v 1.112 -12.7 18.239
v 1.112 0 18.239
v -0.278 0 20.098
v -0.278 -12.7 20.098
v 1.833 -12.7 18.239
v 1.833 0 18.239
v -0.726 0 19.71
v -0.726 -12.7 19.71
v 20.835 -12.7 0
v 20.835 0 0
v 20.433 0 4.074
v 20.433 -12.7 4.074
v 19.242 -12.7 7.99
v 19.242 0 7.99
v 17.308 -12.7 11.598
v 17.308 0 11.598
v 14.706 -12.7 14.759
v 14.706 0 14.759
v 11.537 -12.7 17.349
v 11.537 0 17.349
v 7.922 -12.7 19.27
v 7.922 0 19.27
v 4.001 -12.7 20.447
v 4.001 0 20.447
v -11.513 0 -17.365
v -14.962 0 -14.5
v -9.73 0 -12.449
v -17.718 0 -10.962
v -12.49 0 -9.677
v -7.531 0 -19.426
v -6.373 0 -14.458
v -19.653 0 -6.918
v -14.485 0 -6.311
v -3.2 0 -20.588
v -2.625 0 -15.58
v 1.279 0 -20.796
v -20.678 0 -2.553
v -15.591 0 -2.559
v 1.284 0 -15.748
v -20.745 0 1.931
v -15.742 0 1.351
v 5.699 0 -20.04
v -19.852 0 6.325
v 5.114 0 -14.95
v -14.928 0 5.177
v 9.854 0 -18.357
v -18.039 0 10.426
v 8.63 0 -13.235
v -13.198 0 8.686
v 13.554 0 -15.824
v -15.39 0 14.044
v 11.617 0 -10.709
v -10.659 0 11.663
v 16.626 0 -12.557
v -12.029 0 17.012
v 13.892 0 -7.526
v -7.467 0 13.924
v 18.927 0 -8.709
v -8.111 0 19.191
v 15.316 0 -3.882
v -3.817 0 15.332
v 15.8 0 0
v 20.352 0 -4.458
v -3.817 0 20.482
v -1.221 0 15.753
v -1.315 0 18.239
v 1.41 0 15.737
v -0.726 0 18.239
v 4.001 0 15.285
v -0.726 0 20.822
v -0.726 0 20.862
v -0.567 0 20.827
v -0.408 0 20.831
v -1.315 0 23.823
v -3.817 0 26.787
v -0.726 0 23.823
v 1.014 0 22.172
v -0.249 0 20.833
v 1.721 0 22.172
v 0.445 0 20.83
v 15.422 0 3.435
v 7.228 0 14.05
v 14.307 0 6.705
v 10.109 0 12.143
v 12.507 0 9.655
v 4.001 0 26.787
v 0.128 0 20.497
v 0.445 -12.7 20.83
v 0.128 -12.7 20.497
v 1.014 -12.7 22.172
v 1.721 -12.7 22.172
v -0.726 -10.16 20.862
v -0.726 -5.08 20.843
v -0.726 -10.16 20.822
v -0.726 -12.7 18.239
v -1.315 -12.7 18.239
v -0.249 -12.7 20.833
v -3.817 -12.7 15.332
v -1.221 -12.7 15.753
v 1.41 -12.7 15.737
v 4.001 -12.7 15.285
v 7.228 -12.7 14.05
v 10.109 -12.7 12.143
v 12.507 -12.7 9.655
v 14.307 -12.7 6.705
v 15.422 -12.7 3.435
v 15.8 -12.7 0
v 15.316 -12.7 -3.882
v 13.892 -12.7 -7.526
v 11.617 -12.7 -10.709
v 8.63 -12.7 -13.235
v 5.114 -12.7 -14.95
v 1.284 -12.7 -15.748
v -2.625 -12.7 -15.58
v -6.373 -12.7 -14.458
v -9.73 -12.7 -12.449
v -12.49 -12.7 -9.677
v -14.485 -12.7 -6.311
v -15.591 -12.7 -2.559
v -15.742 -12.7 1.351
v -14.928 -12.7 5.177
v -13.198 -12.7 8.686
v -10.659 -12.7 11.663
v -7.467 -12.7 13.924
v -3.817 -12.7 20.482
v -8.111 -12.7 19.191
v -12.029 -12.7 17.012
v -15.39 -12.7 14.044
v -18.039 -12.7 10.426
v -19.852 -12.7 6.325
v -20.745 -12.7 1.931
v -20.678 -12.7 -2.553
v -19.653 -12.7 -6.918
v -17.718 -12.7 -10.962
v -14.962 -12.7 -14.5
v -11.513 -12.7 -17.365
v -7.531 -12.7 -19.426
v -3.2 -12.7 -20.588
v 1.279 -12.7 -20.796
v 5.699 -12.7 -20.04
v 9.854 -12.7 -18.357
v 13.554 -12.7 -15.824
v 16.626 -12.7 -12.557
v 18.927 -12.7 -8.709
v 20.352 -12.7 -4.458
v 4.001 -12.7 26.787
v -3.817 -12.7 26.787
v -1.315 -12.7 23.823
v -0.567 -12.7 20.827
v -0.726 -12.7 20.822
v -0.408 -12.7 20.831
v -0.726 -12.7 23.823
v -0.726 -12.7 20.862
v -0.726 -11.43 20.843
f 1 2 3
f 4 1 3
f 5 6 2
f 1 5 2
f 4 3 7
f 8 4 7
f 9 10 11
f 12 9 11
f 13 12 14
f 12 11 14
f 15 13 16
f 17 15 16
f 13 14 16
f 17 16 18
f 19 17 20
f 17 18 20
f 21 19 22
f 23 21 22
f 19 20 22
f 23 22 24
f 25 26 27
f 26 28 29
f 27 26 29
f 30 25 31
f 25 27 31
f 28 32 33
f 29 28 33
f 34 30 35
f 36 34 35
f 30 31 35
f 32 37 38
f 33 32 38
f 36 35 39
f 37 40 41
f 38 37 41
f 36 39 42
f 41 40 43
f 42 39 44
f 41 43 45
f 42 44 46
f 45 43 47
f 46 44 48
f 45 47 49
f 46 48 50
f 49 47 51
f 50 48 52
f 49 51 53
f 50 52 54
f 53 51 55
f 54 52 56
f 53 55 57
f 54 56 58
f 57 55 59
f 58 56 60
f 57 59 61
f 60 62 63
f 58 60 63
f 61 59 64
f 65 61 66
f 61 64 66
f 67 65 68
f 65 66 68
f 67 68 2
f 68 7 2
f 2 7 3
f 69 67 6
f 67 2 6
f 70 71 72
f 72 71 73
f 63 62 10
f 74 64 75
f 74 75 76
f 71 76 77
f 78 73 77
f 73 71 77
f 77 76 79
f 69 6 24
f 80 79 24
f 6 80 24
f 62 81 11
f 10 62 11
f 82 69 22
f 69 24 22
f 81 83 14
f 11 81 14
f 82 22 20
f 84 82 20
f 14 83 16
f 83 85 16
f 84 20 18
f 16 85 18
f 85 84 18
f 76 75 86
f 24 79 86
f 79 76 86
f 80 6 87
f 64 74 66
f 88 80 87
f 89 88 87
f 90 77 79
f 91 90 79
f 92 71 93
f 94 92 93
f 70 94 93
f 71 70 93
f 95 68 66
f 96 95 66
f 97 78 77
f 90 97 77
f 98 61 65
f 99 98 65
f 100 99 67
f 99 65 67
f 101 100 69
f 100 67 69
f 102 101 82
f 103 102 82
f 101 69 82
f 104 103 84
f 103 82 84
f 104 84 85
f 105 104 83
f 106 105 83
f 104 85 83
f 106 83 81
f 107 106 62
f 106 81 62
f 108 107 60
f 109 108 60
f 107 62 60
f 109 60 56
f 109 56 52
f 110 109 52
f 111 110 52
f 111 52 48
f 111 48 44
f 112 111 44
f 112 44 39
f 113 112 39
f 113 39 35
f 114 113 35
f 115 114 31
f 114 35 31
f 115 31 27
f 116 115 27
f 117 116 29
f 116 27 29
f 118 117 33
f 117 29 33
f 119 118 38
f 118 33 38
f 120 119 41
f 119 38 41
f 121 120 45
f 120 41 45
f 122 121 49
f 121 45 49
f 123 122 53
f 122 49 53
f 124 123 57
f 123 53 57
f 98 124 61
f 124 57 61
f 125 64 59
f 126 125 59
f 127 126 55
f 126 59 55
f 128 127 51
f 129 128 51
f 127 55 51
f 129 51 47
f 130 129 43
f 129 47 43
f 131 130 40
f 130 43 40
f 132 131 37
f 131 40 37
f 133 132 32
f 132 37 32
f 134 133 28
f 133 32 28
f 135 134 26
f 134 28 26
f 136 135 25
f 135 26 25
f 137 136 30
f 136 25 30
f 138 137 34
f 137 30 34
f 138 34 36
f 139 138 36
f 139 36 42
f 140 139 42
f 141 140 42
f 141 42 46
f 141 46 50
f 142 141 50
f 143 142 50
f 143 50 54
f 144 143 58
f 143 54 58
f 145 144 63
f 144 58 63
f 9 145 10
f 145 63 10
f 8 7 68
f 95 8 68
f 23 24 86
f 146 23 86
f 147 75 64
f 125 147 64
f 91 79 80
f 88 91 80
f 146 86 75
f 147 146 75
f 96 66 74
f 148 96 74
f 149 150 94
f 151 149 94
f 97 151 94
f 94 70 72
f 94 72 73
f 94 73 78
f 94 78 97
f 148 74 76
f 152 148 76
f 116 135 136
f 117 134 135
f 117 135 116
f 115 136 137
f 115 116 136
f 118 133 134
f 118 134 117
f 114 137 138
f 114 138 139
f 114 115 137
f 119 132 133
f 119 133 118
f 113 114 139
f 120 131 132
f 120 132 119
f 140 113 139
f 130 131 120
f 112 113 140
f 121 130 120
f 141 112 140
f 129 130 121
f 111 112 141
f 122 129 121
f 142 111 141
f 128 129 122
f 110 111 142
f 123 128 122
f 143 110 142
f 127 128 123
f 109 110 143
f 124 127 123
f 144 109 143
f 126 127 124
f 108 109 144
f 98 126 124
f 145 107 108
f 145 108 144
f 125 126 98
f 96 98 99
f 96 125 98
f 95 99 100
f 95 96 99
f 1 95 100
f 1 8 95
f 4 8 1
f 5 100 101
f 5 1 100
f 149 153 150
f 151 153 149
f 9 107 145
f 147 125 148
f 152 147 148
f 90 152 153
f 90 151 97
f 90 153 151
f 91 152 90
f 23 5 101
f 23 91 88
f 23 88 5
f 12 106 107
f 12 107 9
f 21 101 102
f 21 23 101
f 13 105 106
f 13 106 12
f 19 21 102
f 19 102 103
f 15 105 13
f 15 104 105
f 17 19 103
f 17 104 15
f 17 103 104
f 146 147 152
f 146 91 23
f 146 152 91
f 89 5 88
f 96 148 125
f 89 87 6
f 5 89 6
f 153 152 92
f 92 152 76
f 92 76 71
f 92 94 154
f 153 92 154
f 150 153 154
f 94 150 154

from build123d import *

# Parameters (mm, degrees)
F1_DEPTH = 10.16
F2_DEPTH = 12.7


with BuildPart() as f1:
    # F0 (on Front) → F1 (new body)
    with BuildSketch(Plane.XZ):
        with BuildLine():
            ThreePointArc((4.0007179822, 15.285099137), (12.5070249084, 9.654756752), (15.8, 0))
            ThreePointArc((15.8, 0), (-9.7296675451, -12.4488380768), (-3.8169075269, 15.332032381))
            Line((-3.8169075269, 15.332032381), (-3.8169075269, 20.4823272433))
            ThreePointArc((-3.8169075269, 20.4823272433), (-13.314831815, -16.0252852116), (20.834934902, 0))
            ThreePointArc((20.834934902, 0), (16.0849185744, 13.2427303388), (4.0007179822, 20.4472190774))
            Line((4.0007179822, 20.4472190774), (4.0007179822, 15.285099137))
        make_face()
        with BuildLine():
            ThreePointArc((-3.8169075269, 15.332032381), (0.0948538519, 15.7997152742), (4.0007179822, 15.285099137))
            Line((4.0007179822, 15.285099137), (4.0007179822, 20.4472190774))
            ThreePointArc((4.0007179822, 20.4472190774), (2.2310298491, 20.7151398302), (0.4448769206, 20.8301847543))
            Line((0.4448769206, 20.8301847543), (0.1276157176, 20.4966947721))
            Line((0.1276157176, 20.4966947721), (1.8328047784, 18.239185214))
            Line((1.8328047784, 18.239185214), (1.1116877884, 18.239185214))
            Line((1.1116877884, 18.239185214), (-0.2777255205, 20.0982431868))
            Line((-0.2777255205, 20.0982431868), (-0.7255529506, 19.7101260807))
            Line((-0.7255529506, 19.7101260807), (-0.7255529506, 18.239185214))
            Line((-0.7255529506, 18.239185214), (-1.3146182626, 18.239185214))
            Line((-1.3146182626, 18.239185214), (-1.3146182626, 20.7934194205))
            ThreePointArc((-1.3146182626, 20.7934194205), (-2.5704734618, 20.6757630707), (-3.8169075269, 20.4823272433))
            Line((-3.8169075269, 20.4823272433), (-3.8169075269, 15.332032381))
        make_face()
        with BuildLine():
            ThreePointArc((0.4448769206, 20.8301847543), (2.2310298491, 20.7151398302), (4.0007179822, 20.4472190774))
            Line((4.0007179822, 20.4472190774), (4.0007179822, 26.7865807325))
            Line((4.0007179822, 26.7865807325), (-3.8169075269, 26.7865807325))
            Line((-3.8169075269, 26.7865807325), (-3.8169075269, 20.4823272433))
            ThreePointArc((-3.8169075269, 20.4823272433), (-2.5704734618, 20.6757630707), (-1.3146182626, 20.7934194205))
            Line((-1.3146182626, 20.7934194205), (-1.3146182626, 23.8232487851))
            Line((-1.3146182626, 23.8232487851), (-0.7255529506, 23.8232487851))
            Line((-0.7255529506, 23.8232487851), (-0.7255529506, 20.861846369))
            add(Edge.make_bspline(
                [(-0.7255529506, 20.861846369), (-0.7255529506, 20.843060722), (-0.7258157075, 20.8222886334)],
                knots=[0, 0, 0, 0.0956718037, 0.0956718037, 0.0956718037], degree=2))
            ThreePointArc((-0.7258157075, 20.8222886334), (-0.4874986739, 20.8292308407), (-0.2491178041, 20.833445531))
            Line((-0.2491178041, 20.833445531), (1.0140843741, 22.172028671))
            Line((1.0140843741, 22.172028671), (1.7214220586, 22.172028671))
            Line((1.7214220586, 22.172028671), (0.4448769206, 20.8301847543))
        make_face()
    extrude(amount=F1_DEPTH)

    # F0 (on Front) → F2 (join)
    with BuildSketch(Plane.XZ):
        with BuildLine():
            ThreePointArc((4.0007179822, 15.285099137), (12.5070249084, 9.654756752), (15.8, 0))
            ThreePointArc((15.8, 0), (-9.7296675451, -12.4488380768), (-3.8169075269, 15.332032381))
            Line((-3.8169075269, 15.332032381), (-3.8169075269, 20.4823272433))
            ThreePointArc((-3.8169075269, 20.4823272433), (-13.314831815, -16.0252852116), (20.834934902, 0))
            ThreePointArc((20.834934902, 0), (16.0849185744, 13.2427303388), (4.0007179822, 20.4472190774))
            Line((4.0007179822, 20.4472190774), (4.0007179822, 15.285099137))
        make_face()
        with BuildLine():
            ThreePointArc((-3.8169075269, 15.332032381), (0.0948538519, 15.7997152742), (4.0007179822, 15.285099137))
            Line((4.0007179822, 15.285099137), (4.0007179822, 20.4472190774))
            ThreePointArc((4.0007179822, 20.4472190774), (2.2310298491, 20.7151398302), (0.4448769206, 20.8301847543))
            Line((0.4448769206, 20.8301847543), (0.1276157176, 20.4966947721))
            Line((0.1276157176, 20.4966947721), (1.8328047784, 18.239185214))
            Line((1.8328047784, 18.239185214), (1.1116877884, 18.239185214))
            Line((1.1116877884, 18.239185214), (-0.2777255205, 20.0982431868))
            Line((-0.2777255205, 20.0982431868), (-0.7255529506, 19.7101260807))
            Line((-0.7255529506, 19.7101260807), (-0.7255529506, 18.239185214))
            Line((-0.7255529506, 18.239185214), (-1.3146182626, 18.239185214))
            Line((-1.3146182626, 18.239185214), (-1.3146182626, 20.7934194205))
            ThreePointArc((-1.3146182626, 20.7934194205), (-2.5704734618, 20.6757630707), (-3.8169075269, 20.4823272433))
            Line((-3.8169075269, 20.4823272433), (-3.8169075269, 15.332032381))
        make_face()
        with BuildLine():
            ThreePointArc((0.4448769206, 20.8301847543), (2.2310298491, 20.7151398302), (4.0007179822, 20.4472190774))
            Line((4.0007179822, 20.4472190774), (4.0007179822, 26.7865807325))
            Line((4.0007179822, 26.7865807325), (-3.8169075269, 26.7865807325))
            Line((-3.8169075269, 26.7865807325), (-3.8169075269, 20.4823272433))
            ThreePointArc((-3.8169075269, 20.4823272433), (-2.5704734618, 20.6757630707), (-1.3146182626, 20.7934194205))
            Line((-1.3146182626, 20.7934194205), (-1.3146182626, 23.8232487851))
            Line((-1.3146182626, 23.8232487851), (-0.7255529506, 23.8232487851))
            Line((-0.7255529506, 23.8232487851), (-0.7255529506, 20.861846369))
            add(Edge.make_bspline(
                [(-0.7255529506, 20.861846369), (-0.7255529506, 20.843060722), (-0.7258157075, 20.8222886334)],
                knots=[0, 0, 0, 0.0956718037, 0.0956718037, 0.0956718037], degree=2))
            ThreePointArc((-0.7258157075, 20.8222886334), (-0.4874986739, 20.8292308407), (-0.2491178041, 20.833445531))
            Line((-0.2491178041, 20.833445531), (1.0140843741, 22.172028671))
            Line((1.0140843741, 22.172028671), (1.7214220586, 22.172028671))
            Line((1.7214220586, 22.172028671), (0.4448769206, 20.8301847543))
        make_face()
    extrude(amount=F2_DEPTH)


solid = f1.part
